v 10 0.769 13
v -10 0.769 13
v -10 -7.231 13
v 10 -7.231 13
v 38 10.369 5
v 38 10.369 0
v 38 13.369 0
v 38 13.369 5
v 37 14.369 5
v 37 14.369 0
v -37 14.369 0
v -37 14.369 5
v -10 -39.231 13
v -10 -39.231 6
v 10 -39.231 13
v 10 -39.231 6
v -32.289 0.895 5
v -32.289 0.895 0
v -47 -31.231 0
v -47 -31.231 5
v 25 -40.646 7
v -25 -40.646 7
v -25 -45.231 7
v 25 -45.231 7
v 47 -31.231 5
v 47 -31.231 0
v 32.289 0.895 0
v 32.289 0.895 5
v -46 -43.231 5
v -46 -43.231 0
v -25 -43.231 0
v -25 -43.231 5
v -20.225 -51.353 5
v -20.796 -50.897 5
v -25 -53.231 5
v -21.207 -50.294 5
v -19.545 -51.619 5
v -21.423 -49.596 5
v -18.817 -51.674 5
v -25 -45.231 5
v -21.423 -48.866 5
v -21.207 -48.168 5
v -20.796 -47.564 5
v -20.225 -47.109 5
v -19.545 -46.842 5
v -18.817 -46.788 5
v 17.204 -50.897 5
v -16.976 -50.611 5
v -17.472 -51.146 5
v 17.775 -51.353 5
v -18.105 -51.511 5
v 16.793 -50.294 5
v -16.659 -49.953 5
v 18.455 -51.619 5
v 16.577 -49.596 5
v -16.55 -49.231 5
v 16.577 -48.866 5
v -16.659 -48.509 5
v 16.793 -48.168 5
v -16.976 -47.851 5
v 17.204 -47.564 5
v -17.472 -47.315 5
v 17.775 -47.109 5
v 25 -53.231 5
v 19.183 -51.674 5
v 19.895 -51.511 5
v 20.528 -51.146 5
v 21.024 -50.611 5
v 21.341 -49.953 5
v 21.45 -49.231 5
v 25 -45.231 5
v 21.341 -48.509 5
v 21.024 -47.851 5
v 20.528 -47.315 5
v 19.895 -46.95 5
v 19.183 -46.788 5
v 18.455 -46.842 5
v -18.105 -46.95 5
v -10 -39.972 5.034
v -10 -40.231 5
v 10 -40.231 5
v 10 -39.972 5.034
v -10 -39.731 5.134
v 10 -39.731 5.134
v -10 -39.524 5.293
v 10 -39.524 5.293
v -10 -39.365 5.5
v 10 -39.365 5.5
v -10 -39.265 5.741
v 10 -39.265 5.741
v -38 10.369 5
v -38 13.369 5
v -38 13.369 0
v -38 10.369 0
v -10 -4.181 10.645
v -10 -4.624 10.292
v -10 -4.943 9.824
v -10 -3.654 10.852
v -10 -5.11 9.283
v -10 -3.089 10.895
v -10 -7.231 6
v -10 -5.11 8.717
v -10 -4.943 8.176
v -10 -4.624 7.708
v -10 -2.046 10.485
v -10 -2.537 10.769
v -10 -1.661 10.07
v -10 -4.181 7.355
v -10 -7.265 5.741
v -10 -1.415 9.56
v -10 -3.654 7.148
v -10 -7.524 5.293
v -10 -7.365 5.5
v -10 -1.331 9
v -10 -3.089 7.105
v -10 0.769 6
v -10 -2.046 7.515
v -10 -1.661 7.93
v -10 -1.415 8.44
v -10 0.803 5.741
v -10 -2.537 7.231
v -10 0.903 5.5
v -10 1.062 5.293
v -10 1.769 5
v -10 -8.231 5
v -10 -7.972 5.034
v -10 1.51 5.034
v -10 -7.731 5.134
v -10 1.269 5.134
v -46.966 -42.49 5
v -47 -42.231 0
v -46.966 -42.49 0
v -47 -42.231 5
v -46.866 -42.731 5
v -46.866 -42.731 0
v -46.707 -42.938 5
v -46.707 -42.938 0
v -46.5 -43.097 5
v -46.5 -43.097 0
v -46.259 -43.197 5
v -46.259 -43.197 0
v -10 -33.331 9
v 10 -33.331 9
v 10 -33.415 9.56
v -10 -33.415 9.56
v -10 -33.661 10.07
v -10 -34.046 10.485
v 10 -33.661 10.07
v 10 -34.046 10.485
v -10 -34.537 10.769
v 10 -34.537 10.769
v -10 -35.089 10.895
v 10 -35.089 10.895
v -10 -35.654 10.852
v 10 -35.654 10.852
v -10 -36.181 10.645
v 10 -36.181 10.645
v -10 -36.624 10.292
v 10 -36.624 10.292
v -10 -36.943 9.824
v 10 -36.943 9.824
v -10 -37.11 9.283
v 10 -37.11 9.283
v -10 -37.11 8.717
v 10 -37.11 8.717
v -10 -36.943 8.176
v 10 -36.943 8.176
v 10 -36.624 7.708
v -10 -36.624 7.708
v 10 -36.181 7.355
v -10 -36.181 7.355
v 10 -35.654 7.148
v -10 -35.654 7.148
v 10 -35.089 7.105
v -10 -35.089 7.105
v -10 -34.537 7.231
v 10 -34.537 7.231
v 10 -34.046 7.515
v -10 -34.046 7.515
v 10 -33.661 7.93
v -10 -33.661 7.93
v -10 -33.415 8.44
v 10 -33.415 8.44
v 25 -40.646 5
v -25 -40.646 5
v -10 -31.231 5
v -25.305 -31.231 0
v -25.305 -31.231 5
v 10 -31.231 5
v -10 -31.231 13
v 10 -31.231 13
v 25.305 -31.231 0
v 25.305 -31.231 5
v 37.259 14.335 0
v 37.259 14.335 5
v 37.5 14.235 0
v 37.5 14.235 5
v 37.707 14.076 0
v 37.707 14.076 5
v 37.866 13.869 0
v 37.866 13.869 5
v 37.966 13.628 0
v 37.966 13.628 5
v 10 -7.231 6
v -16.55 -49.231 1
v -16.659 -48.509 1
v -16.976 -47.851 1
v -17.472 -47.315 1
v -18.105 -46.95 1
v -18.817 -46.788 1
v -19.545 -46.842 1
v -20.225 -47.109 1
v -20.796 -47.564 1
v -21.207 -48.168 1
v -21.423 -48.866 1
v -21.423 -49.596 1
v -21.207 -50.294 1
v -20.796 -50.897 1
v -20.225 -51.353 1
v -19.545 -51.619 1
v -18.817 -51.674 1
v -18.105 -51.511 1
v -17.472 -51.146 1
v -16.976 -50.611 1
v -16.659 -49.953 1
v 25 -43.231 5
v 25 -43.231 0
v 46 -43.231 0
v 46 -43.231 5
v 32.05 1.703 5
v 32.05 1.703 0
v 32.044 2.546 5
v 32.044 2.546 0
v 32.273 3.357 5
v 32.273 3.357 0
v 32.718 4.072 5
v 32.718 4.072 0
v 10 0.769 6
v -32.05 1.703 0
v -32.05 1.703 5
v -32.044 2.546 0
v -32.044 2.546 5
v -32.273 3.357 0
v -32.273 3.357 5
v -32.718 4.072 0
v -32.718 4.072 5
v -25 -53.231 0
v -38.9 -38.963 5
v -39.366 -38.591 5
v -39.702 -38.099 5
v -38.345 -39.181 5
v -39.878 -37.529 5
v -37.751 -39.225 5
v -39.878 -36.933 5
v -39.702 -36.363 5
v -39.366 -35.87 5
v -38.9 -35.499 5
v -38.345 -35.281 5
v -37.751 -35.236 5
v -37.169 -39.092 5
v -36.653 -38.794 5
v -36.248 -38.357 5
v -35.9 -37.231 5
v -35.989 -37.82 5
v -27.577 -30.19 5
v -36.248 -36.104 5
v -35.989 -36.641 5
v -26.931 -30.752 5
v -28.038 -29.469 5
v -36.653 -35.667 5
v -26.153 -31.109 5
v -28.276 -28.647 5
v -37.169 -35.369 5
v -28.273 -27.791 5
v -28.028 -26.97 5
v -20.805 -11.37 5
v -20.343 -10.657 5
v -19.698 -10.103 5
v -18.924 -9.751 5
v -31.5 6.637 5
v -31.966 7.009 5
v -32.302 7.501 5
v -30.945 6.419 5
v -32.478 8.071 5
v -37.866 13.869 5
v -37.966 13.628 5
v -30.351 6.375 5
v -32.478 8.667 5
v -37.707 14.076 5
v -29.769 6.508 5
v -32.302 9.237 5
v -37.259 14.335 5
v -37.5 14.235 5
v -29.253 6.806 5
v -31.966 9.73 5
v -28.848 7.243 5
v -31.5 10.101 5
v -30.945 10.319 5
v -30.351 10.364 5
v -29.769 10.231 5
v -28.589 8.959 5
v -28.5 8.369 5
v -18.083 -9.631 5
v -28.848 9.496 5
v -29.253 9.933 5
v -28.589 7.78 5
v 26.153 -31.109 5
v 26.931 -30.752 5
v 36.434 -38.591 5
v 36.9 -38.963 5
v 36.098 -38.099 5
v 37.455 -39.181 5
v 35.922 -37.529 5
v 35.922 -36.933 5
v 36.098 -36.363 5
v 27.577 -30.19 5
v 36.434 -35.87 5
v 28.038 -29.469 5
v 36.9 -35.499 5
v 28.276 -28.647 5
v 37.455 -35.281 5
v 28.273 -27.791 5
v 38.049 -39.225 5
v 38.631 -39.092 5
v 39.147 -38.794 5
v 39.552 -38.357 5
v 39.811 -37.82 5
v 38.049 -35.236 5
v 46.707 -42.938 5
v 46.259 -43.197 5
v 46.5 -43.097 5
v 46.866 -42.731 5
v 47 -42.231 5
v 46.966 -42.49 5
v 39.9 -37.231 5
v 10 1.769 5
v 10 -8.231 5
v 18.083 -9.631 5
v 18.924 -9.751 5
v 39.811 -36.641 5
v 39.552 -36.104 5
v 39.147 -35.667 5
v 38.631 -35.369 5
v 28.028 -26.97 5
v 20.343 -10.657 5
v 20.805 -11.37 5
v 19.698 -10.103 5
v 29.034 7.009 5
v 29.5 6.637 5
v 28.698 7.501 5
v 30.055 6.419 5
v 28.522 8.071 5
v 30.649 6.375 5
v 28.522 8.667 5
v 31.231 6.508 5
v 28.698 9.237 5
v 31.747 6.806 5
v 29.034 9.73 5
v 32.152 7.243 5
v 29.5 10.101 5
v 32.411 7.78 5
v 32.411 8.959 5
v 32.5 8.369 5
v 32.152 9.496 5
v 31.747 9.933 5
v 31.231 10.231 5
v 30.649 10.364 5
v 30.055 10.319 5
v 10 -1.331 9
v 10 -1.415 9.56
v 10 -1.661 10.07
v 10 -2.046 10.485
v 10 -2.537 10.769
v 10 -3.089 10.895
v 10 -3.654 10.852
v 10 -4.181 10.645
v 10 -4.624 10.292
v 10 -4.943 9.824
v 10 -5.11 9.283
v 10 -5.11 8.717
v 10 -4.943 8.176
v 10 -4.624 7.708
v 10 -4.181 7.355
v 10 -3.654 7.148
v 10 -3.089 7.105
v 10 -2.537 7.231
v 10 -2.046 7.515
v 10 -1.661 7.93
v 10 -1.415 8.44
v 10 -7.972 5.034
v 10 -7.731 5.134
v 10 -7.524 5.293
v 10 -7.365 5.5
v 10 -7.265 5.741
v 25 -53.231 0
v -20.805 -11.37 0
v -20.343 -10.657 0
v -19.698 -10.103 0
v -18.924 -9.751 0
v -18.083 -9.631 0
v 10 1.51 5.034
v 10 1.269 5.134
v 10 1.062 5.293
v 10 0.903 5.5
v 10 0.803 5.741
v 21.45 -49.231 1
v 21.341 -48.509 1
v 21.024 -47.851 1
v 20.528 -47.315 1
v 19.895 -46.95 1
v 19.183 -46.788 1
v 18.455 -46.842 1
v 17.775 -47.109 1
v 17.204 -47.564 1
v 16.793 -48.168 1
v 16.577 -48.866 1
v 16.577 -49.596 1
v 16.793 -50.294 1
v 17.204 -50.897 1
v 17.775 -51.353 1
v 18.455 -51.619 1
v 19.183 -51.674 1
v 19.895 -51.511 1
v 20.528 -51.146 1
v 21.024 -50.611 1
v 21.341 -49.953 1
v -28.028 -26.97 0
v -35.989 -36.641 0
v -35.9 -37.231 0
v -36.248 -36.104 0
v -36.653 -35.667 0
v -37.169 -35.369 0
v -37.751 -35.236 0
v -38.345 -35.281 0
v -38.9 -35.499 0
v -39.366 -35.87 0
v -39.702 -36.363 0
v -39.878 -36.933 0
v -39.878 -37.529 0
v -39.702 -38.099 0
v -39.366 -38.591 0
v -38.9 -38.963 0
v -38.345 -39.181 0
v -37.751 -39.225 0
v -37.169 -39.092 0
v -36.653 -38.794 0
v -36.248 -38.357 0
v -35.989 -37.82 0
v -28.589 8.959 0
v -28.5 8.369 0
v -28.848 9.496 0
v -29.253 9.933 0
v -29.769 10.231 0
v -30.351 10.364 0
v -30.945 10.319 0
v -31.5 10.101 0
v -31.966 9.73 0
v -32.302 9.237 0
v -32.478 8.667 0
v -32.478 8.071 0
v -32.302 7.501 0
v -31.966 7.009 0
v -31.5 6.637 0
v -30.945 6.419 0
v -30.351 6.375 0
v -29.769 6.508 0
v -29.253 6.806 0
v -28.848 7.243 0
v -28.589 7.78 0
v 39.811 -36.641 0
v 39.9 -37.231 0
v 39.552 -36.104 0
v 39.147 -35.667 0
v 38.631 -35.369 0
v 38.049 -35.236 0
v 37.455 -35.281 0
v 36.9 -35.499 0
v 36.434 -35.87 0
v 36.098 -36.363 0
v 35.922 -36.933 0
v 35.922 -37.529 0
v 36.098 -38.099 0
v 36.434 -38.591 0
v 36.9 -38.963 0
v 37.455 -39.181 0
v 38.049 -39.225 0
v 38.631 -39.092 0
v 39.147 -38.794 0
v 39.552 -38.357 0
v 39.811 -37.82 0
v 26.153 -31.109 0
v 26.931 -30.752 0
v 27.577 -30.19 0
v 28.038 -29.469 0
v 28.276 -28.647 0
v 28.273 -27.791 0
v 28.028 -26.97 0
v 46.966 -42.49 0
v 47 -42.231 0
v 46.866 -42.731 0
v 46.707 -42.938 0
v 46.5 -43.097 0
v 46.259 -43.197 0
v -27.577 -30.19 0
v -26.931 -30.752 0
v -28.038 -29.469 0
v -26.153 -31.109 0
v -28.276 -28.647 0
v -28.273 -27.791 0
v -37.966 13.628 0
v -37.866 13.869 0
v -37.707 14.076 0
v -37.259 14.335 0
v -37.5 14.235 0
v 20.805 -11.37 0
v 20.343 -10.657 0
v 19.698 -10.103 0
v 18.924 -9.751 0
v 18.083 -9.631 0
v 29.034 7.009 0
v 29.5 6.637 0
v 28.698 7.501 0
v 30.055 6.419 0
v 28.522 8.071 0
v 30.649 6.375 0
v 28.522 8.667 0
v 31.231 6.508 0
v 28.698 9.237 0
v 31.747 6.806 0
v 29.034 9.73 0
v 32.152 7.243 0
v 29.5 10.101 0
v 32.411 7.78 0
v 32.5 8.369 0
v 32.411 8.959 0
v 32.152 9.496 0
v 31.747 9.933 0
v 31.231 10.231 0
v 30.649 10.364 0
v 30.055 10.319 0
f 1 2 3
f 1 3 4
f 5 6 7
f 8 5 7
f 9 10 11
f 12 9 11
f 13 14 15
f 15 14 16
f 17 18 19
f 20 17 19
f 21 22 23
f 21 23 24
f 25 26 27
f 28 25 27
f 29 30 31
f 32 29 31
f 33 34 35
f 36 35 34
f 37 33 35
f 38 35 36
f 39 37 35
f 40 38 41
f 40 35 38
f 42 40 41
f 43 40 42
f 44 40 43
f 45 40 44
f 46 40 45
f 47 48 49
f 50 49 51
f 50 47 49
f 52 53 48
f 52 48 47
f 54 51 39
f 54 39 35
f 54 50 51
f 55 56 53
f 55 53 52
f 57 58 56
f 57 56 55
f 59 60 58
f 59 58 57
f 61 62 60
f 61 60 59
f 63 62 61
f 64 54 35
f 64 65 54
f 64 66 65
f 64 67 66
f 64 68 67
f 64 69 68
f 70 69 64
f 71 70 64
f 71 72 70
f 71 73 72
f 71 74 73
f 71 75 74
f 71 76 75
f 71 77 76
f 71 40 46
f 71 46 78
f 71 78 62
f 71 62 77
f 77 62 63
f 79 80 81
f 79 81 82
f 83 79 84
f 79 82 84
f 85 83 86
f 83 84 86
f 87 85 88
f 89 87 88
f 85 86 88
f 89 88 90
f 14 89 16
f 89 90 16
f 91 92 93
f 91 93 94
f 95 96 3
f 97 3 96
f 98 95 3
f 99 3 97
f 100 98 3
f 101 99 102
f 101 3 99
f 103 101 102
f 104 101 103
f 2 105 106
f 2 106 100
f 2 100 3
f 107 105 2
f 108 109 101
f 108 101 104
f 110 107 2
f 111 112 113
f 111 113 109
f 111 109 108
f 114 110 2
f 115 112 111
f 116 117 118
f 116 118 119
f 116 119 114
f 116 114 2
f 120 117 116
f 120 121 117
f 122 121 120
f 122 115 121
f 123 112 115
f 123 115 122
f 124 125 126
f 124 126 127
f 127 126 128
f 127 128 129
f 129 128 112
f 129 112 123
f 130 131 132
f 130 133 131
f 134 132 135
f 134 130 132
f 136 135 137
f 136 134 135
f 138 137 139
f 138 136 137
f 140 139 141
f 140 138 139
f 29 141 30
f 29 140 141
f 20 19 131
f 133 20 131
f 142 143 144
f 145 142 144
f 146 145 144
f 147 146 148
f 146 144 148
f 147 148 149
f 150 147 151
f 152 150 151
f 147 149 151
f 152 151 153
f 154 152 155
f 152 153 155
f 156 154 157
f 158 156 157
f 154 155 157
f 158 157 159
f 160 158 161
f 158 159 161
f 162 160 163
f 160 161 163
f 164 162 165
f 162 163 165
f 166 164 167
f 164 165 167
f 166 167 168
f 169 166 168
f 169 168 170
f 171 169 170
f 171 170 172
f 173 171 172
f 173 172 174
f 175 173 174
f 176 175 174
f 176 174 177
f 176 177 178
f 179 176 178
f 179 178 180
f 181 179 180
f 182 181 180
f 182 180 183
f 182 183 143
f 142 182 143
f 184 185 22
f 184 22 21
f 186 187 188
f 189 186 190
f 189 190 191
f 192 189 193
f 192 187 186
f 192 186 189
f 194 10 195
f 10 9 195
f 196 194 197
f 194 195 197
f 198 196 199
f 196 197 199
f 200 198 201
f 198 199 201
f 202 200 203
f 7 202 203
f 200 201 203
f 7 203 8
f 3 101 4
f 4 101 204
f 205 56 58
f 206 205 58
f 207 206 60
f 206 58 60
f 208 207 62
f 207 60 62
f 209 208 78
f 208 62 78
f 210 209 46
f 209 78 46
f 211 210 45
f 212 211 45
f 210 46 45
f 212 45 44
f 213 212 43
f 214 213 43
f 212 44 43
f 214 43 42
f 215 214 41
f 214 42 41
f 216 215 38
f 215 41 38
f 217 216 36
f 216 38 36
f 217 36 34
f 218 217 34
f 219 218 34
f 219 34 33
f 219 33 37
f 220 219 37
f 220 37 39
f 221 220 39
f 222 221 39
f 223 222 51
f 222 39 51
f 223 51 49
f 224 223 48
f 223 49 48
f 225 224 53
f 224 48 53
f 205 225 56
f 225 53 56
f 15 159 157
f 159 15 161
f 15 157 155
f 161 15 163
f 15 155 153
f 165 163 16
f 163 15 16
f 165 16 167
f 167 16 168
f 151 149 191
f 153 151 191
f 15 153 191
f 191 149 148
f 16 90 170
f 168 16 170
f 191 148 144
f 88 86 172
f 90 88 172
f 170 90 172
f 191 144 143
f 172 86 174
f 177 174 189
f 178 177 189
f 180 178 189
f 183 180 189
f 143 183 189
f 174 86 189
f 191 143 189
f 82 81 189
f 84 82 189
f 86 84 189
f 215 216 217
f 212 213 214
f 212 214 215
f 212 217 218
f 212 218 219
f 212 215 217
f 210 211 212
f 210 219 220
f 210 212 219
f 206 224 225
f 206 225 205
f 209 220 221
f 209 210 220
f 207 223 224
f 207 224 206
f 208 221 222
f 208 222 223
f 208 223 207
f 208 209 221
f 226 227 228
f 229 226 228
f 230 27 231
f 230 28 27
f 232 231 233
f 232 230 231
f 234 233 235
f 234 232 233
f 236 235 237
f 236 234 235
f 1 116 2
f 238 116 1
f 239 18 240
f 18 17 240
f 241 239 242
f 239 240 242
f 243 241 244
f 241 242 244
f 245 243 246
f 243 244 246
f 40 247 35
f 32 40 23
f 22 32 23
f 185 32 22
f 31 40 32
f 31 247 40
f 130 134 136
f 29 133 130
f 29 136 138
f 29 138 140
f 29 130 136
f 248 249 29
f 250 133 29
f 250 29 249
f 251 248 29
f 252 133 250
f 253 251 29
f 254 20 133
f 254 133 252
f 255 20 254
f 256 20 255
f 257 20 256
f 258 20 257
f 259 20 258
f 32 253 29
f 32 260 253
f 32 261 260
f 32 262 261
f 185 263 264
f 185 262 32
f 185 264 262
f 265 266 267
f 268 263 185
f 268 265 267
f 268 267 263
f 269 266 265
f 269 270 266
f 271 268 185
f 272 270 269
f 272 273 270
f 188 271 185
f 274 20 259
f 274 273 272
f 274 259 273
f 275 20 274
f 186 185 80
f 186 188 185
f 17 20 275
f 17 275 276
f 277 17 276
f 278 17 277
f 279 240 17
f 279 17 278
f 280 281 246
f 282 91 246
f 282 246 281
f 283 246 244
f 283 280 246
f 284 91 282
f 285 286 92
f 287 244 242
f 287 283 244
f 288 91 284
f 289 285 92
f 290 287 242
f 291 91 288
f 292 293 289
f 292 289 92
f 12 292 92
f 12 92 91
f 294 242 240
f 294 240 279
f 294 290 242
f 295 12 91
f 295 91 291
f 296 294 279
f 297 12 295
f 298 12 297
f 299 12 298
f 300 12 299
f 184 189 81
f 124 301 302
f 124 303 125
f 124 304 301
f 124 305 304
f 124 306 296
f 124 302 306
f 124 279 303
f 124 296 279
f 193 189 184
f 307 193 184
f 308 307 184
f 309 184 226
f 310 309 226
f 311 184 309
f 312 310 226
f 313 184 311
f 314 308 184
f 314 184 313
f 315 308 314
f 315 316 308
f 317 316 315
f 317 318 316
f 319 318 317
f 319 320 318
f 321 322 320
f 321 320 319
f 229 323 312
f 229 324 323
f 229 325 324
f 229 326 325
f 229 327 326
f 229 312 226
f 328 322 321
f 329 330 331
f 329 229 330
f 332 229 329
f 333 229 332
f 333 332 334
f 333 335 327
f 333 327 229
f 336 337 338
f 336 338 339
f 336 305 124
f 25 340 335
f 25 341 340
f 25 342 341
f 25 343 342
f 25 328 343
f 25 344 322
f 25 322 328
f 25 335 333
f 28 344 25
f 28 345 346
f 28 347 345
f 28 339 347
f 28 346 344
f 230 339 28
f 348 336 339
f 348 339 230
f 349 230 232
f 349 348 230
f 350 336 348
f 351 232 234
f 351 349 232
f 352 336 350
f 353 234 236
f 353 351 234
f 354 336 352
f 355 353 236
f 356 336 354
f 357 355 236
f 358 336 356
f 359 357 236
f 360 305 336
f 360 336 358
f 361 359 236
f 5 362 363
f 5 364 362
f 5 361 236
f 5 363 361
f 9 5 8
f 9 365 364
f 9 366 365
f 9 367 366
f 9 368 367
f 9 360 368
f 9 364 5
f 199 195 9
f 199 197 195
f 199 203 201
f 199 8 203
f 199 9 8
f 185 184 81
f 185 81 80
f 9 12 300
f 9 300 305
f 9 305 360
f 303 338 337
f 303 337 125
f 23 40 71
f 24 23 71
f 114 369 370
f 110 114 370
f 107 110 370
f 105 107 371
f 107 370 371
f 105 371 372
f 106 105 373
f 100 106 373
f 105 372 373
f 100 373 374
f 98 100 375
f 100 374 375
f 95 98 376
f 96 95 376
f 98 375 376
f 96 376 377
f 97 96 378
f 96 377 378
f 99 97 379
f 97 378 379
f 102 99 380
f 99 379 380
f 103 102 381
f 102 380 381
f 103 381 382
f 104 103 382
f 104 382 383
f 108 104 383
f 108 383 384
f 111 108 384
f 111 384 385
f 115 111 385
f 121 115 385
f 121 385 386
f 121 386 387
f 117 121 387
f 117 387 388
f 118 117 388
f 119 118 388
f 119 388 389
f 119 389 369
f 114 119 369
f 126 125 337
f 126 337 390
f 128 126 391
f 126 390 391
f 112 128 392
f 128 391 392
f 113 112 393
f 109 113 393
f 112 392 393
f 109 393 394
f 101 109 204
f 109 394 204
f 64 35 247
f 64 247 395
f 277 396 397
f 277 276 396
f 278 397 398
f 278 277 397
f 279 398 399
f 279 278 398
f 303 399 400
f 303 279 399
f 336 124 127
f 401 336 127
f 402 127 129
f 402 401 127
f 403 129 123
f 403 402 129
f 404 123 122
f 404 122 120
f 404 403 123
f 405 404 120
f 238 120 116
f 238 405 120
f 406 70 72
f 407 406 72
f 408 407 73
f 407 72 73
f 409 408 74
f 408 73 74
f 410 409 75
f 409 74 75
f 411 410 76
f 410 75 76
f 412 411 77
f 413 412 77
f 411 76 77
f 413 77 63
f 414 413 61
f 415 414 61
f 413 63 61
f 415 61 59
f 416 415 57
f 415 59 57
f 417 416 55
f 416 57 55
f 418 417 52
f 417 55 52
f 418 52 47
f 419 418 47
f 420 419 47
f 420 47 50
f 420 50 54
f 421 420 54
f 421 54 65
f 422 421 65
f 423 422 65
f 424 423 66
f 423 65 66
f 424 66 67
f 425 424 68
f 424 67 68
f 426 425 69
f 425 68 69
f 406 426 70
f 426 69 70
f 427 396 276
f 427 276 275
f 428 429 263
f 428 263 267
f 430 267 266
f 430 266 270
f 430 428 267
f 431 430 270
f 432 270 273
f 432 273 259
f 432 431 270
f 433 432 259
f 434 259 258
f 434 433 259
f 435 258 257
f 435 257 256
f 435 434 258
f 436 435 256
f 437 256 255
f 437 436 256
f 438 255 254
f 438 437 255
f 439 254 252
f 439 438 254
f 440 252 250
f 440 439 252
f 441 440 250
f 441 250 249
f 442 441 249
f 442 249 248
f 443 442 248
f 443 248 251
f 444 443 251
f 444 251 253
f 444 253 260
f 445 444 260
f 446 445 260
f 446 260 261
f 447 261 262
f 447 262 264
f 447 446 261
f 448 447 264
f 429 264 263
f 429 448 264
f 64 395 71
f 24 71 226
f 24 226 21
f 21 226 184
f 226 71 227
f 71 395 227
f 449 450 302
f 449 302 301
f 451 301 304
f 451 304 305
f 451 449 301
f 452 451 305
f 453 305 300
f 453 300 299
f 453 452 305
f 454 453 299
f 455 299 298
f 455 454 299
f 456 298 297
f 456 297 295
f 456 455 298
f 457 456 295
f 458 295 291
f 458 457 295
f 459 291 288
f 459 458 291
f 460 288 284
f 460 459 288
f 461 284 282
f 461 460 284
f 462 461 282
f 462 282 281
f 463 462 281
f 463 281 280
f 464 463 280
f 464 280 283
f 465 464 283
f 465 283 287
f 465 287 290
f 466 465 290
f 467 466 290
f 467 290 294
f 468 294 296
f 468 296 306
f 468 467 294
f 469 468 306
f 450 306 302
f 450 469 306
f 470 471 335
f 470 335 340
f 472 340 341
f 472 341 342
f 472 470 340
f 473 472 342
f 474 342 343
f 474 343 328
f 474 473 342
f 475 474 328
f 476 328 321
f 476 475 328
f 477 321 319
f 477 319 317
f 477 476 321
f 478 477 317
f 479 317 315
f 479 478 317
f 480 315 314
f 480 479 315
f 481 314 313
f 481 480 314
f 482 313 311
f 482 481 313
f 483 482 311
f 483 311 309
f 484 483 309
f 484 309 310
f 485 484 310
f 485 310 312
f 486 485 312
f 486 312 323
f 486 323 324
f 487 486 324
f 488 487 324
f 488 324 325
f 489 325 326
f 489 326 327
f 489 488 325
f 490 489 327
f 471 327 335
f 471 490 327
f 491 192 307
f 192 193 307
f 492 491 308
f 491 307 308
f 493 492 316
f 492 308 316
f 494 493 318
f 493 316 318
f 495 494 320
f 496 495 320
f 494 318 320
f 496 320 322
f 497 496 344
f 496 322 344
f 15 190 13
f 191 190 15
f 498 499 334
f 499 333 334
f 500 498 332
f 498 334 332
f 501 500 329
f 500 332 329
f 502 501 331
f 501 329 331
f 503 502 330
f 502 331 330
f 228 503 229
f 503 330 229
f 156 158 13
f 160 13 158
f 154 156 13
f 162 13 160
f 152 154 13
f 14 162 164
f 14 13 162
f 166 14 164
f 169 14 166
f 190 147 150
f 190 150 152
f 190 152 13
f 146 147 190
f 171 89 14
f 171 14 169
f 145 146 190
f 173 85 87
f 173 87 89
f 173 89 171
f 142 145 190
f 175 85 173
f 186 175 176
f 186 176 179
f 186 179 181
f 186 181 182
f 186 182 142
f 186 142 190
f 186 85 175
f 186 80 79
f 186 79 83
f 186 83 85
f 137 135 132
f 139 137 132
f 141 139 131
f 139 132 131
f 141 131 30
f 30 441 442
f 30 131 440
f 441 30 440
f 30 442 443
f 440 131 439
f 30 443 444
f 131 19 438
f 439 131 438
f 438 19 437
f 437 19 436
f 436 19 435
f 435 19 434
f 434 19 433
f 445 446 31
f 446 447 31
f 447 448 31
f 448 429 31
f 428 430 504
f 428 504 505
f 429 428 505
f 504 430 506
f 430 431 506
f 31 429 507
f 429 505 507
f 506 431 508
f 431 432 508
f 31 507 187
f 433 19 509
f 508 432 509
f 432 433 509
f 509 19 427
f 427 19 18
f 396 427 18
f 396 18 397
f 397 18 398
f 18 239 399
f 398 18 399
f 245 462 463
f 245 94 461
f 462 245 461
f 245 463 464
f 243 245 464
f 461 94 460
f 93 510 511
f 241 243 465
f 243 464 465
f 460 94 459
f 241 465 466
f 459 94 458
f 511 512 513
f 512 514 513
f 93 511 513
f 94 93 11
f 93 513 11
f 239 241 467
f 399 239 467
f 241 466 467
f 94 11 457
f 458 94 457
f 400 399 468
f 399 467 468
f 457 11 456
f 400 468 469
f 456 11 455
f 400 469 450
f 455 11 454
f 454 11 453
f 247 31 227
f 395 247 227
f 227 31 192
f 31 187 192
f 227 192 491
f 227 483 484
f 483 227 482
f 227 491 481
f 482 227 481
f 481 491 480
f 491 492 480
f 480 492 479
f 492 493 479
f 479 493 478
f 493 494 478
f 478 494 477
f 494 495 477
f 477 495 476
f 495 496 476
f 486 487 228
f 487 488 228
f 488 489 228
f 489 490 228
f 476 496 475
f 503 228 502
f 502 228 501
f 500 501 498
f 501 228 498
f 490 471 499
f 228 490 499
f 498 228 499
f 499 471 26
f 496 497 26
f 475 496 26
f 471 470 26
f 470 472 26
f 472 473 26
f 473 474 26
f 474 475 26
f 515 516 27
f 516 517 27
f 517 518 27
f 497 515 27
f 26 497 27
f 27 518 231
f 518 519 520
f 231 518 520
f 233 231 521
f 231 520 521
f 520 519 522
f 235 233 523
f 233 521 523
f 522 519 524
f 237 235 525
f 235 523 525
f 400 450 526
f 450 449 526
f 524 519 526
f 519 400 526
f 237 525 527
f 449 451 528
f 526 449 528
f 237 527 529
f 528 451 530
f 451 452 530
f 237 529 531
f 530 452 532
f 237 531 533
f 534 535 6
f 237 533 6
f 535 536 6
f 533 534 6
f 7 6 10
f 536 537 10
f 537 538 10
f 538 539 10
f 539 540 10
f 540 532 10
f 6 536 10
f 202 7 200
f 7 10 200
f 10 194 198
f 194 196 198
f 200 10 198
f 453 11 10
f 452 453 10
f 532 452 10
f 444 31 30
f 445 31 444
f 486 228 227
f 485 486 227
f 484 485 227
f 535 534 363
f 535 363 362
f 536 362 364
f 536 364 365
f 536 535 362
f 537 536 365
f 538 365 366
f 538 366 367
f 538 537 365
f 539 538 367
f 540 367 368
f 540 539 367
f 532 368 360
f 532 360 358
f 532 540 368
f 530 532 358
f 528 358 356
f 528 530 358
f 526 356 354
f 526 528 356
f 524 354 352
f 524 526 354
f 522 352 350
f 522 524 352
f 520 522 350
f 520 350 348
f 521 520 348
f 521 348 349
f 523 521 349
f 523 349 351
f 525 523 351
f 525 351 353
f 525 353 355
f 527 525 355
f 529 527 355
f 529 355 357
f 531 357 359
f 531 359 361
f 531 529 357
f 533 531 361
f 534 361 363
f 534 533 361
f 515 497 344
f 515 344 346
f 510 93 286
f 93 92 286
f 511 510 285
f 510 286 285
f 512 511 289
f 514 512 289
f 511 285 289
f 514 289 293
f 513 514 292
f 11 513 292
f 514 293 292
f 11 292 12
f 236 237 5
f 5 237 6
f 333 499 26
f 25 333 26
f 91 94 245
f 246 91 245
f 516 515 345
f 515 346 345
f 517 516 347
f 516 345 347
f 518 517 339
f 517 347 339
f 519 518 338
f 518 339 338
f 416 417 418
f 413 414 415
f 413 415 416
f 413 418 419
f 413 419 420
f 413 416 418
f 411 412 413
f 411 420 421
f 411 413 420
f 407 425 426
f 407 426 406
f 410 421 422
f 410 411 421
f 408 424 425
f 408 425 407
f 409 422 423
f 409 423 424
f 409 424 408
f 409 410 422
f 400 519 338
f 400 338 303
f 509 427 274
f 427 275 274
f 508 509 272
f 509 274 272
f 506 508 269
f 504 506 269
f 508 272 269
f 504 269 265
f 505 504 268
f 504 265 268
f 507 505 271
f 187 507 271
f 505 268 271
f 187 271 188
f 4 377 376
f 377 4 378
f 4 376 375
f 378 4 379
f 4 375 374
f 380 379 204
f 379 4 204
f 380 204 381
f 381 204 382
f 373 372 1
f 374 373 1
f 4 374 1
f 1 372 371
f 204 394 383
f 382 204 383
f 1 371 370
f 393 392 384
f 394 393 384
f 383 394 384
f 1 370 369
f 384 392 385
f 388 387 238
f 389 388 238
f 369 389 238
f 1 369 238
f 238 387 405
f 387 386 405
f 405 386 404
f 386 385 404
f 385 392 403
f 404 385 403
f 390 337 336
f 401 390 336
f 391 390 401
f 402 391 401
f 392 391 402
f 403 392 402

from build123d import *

# Parameters (mm, degrees)
SKETCH_1_R          = 2
EXTRUDE_2_DEPTH     = 5
SKETCH_3_W          = 20
SKETCH_3_H          = 8
EXTRUDE_3_DEPTH     = 8
SKETCH_4_R          = 1.9
CUT_EXTRUDE_1_DEPTH = 73.711050963
FILLET_1_R          = 3
FILLET_2_R          = 3
SKETCH_5_W          = 25
SKETCH_5_H          = 10
EXTRUDE_4_DEPTH     = 5
SKETCH_6_W          = 50
SKETCH_6_H          = 4.584747815
EXTRUDE_5_DEPTH     = 2
FILLET_3_R          = 1
FILLET_4_R          = 1
SKETCH_7_R          = 2.45
CUT_EXTRUDE_2_DEPTH = 4
FILLET_5_R          = 1
FILLET_6_R          = 1


with BuildPart() as part:
    # ｽｹｯﾁ1 → ﾎﾞｽ - 押し出し2 (new body)
    with BuildSketch(Plane.XY):
        Polygon((-47, -31.230740592), (-47, -43.230740592), (47, -43.230740592), (47, -31.230740592), (31.5, 2.619259408), (38, 10.369259408), (38, 14.369259408), (-38, 14.369259408), (-38, 10.369259408), (-31.5, 2.619259408), align=None)
        with Locations((-30.5, 8.369259408)):
            Circle(SKETCH_1_R, mode=Mode.SUBTRACT)
        with Locations((30.5, 8.369259408)):
            Circle(SKETCH_1_R, mode=Mode.SUBTRACT)
        with Locations((-37.9, -37.230740592)):
            Circle(SKETCH_1_R, mode=Mode.SUBTRACT)
        with Locations((37.9, -37.230740592)):
            Circle(SKETCH_1_R, mode=Mode.SUBTRACT)
        Polygon((-20, -9.630740592), (-30, -31.230740592), (30, -31.230740592), (20, -9.630740592), align=None, mode=Mode.SUBTRACT)
    extrude(amount=EXTRUDE_2_DEPTH)

    # ｽｹｯﾁ3 → ﾎﾞｽ - 押し出し3 (add)
    with BuildSketch(Plane.XY.offset(5)):
        with Locations((0, -3.230740592)):
            Rectangle(SKETCH_3_W, SKETCH_3_H)
        with Locations((0, -35.230740592)):
            Rectangle(SKETCH_3_W, SKETCH_3_H)
    extrude(amount=EXTRUDE_3_DEPTH)

    # ｽｹｯﾁ4 → ｶｯﾄ - 押し出し1 (cut, through all)
    with BuildSketch(Plane(origin=(10, 0, 0), x_dir=(0, 0, -1), z_dir=(1, 0, 0))):
        with Locations(Location((-9, -3.230740592, 0), (0, 0, 90))):
            Circle(SKETCH_4_R)
        with Locations(Location((-9, -35.230740592, 0), (0, 0, 90))):
            Circle(SKETCH_4_R)
    extrude(amount=-CUT_EXTRUDE_1_DEPTH, mode=Mode.SUBTRACT)

    # ﾌｨﾚｯﾄ1
    fillet_1_edges = [part.edges().sort_by_distance(p)[0] for p in [
        (-30, -31.230740592, 2.5),
        (30, -31.230740592, 2.5),
        (20, -9.630740592, 2.5),
        (-20, -9.630740592, 2.5),
    ]]
    fillet(fillet_1_edges, radius=FILLET_1_R)

    # ﾌｨﾚｯﾄ2
    fillet_2_edges = [part.edges().sort_by_distance(p)[0] for p in [
        (-31.5, 2.619259408, 2.5),
        (31.5, 2.619259408, 2.5),
    ]]
    fillet(fillet_2_edges, radius=FILLET_2_R)

    # ｽｹｯﾁ5 → ﾎﾞｽ - 押し出し4 (add)
    with BuildSketch(Plane.XY.offset(5)):
        with Locations((12.5, -48.230740592)):
            Rectangle(SKETCH_5_W, SKETCH_5_H)
        with Locations((-12.5, -48.230740592)):
            Rectangle(SKETCH_5_W, SKETCH_5_H)
    extrude(amount=-EXTRUDE_4_DEPTH)

    # ｽｹｯﾁ6 → ﾎﾞｽ - 押し出し5 (add)
    with BuildSketch(Plane.XY.offset(5)):
        with Locations((0, -42.938366685)):
            Rectangle(SKETCH_6_W, SKETCH_6_H)
    extrude(amount=EXTRUDE_5_DEPTH)

    # ﾌｨﾚｯﾄ3
    fillet_3_edges = [part.edges().sort_by_distance(p)[0] for p in [
        (-38, 14.369259408, 2.5),
        (38, 14.369259408, 2.5),
    ]]
    fillet(fillet_3_edges, radius=FILLET_3_R)

    # ﾌｨﾚｯﾄ4
    fillet_4_edges = [part.edges().sort_by_distance(p)[0] for p in [
        (47, -43.230740592, 2.5),
        (-47, -43.230740592, 2.5),
    ]]
    fillet(fillet_4_edges, radius=FILLET_4_R)

    # ｽｹｯﾁ7 → ｶｯﾄ - 押し出し2 (cut)
    with BuildSketch(Plane.XY.offset(5)):
        with Locations((-19, -49.230740592)):
            Circle(SKETCH_7_R)
        with Locations((19, -49.230740592)):
            Circle(SKETCH_7_R)
    extrude(amount=-CUT_EXTRUDE_2_DEPTH, mode=Mode.SUBTRACT)

    # ﾌｨﾚｯﾄ5
    fillet_5_edges = [part.edges().sort_by_distance(p)[0] for p in [
        (0, 0.769259408, 5),
        (0, -7.230740592, 5),
    ]]
    fillet(fillet_5_edges, radius=FILLET_5_R)

    # ﾌｨﾚｯﾄ6
    fillet_6_edges = [part.edges().sort_by_distance(p)[0] for p in [
        (0, -39.230740592, 5),
    ]]
    fillet(fillet_6_edges, radius=FILLET_6_R)


solid = part.part
